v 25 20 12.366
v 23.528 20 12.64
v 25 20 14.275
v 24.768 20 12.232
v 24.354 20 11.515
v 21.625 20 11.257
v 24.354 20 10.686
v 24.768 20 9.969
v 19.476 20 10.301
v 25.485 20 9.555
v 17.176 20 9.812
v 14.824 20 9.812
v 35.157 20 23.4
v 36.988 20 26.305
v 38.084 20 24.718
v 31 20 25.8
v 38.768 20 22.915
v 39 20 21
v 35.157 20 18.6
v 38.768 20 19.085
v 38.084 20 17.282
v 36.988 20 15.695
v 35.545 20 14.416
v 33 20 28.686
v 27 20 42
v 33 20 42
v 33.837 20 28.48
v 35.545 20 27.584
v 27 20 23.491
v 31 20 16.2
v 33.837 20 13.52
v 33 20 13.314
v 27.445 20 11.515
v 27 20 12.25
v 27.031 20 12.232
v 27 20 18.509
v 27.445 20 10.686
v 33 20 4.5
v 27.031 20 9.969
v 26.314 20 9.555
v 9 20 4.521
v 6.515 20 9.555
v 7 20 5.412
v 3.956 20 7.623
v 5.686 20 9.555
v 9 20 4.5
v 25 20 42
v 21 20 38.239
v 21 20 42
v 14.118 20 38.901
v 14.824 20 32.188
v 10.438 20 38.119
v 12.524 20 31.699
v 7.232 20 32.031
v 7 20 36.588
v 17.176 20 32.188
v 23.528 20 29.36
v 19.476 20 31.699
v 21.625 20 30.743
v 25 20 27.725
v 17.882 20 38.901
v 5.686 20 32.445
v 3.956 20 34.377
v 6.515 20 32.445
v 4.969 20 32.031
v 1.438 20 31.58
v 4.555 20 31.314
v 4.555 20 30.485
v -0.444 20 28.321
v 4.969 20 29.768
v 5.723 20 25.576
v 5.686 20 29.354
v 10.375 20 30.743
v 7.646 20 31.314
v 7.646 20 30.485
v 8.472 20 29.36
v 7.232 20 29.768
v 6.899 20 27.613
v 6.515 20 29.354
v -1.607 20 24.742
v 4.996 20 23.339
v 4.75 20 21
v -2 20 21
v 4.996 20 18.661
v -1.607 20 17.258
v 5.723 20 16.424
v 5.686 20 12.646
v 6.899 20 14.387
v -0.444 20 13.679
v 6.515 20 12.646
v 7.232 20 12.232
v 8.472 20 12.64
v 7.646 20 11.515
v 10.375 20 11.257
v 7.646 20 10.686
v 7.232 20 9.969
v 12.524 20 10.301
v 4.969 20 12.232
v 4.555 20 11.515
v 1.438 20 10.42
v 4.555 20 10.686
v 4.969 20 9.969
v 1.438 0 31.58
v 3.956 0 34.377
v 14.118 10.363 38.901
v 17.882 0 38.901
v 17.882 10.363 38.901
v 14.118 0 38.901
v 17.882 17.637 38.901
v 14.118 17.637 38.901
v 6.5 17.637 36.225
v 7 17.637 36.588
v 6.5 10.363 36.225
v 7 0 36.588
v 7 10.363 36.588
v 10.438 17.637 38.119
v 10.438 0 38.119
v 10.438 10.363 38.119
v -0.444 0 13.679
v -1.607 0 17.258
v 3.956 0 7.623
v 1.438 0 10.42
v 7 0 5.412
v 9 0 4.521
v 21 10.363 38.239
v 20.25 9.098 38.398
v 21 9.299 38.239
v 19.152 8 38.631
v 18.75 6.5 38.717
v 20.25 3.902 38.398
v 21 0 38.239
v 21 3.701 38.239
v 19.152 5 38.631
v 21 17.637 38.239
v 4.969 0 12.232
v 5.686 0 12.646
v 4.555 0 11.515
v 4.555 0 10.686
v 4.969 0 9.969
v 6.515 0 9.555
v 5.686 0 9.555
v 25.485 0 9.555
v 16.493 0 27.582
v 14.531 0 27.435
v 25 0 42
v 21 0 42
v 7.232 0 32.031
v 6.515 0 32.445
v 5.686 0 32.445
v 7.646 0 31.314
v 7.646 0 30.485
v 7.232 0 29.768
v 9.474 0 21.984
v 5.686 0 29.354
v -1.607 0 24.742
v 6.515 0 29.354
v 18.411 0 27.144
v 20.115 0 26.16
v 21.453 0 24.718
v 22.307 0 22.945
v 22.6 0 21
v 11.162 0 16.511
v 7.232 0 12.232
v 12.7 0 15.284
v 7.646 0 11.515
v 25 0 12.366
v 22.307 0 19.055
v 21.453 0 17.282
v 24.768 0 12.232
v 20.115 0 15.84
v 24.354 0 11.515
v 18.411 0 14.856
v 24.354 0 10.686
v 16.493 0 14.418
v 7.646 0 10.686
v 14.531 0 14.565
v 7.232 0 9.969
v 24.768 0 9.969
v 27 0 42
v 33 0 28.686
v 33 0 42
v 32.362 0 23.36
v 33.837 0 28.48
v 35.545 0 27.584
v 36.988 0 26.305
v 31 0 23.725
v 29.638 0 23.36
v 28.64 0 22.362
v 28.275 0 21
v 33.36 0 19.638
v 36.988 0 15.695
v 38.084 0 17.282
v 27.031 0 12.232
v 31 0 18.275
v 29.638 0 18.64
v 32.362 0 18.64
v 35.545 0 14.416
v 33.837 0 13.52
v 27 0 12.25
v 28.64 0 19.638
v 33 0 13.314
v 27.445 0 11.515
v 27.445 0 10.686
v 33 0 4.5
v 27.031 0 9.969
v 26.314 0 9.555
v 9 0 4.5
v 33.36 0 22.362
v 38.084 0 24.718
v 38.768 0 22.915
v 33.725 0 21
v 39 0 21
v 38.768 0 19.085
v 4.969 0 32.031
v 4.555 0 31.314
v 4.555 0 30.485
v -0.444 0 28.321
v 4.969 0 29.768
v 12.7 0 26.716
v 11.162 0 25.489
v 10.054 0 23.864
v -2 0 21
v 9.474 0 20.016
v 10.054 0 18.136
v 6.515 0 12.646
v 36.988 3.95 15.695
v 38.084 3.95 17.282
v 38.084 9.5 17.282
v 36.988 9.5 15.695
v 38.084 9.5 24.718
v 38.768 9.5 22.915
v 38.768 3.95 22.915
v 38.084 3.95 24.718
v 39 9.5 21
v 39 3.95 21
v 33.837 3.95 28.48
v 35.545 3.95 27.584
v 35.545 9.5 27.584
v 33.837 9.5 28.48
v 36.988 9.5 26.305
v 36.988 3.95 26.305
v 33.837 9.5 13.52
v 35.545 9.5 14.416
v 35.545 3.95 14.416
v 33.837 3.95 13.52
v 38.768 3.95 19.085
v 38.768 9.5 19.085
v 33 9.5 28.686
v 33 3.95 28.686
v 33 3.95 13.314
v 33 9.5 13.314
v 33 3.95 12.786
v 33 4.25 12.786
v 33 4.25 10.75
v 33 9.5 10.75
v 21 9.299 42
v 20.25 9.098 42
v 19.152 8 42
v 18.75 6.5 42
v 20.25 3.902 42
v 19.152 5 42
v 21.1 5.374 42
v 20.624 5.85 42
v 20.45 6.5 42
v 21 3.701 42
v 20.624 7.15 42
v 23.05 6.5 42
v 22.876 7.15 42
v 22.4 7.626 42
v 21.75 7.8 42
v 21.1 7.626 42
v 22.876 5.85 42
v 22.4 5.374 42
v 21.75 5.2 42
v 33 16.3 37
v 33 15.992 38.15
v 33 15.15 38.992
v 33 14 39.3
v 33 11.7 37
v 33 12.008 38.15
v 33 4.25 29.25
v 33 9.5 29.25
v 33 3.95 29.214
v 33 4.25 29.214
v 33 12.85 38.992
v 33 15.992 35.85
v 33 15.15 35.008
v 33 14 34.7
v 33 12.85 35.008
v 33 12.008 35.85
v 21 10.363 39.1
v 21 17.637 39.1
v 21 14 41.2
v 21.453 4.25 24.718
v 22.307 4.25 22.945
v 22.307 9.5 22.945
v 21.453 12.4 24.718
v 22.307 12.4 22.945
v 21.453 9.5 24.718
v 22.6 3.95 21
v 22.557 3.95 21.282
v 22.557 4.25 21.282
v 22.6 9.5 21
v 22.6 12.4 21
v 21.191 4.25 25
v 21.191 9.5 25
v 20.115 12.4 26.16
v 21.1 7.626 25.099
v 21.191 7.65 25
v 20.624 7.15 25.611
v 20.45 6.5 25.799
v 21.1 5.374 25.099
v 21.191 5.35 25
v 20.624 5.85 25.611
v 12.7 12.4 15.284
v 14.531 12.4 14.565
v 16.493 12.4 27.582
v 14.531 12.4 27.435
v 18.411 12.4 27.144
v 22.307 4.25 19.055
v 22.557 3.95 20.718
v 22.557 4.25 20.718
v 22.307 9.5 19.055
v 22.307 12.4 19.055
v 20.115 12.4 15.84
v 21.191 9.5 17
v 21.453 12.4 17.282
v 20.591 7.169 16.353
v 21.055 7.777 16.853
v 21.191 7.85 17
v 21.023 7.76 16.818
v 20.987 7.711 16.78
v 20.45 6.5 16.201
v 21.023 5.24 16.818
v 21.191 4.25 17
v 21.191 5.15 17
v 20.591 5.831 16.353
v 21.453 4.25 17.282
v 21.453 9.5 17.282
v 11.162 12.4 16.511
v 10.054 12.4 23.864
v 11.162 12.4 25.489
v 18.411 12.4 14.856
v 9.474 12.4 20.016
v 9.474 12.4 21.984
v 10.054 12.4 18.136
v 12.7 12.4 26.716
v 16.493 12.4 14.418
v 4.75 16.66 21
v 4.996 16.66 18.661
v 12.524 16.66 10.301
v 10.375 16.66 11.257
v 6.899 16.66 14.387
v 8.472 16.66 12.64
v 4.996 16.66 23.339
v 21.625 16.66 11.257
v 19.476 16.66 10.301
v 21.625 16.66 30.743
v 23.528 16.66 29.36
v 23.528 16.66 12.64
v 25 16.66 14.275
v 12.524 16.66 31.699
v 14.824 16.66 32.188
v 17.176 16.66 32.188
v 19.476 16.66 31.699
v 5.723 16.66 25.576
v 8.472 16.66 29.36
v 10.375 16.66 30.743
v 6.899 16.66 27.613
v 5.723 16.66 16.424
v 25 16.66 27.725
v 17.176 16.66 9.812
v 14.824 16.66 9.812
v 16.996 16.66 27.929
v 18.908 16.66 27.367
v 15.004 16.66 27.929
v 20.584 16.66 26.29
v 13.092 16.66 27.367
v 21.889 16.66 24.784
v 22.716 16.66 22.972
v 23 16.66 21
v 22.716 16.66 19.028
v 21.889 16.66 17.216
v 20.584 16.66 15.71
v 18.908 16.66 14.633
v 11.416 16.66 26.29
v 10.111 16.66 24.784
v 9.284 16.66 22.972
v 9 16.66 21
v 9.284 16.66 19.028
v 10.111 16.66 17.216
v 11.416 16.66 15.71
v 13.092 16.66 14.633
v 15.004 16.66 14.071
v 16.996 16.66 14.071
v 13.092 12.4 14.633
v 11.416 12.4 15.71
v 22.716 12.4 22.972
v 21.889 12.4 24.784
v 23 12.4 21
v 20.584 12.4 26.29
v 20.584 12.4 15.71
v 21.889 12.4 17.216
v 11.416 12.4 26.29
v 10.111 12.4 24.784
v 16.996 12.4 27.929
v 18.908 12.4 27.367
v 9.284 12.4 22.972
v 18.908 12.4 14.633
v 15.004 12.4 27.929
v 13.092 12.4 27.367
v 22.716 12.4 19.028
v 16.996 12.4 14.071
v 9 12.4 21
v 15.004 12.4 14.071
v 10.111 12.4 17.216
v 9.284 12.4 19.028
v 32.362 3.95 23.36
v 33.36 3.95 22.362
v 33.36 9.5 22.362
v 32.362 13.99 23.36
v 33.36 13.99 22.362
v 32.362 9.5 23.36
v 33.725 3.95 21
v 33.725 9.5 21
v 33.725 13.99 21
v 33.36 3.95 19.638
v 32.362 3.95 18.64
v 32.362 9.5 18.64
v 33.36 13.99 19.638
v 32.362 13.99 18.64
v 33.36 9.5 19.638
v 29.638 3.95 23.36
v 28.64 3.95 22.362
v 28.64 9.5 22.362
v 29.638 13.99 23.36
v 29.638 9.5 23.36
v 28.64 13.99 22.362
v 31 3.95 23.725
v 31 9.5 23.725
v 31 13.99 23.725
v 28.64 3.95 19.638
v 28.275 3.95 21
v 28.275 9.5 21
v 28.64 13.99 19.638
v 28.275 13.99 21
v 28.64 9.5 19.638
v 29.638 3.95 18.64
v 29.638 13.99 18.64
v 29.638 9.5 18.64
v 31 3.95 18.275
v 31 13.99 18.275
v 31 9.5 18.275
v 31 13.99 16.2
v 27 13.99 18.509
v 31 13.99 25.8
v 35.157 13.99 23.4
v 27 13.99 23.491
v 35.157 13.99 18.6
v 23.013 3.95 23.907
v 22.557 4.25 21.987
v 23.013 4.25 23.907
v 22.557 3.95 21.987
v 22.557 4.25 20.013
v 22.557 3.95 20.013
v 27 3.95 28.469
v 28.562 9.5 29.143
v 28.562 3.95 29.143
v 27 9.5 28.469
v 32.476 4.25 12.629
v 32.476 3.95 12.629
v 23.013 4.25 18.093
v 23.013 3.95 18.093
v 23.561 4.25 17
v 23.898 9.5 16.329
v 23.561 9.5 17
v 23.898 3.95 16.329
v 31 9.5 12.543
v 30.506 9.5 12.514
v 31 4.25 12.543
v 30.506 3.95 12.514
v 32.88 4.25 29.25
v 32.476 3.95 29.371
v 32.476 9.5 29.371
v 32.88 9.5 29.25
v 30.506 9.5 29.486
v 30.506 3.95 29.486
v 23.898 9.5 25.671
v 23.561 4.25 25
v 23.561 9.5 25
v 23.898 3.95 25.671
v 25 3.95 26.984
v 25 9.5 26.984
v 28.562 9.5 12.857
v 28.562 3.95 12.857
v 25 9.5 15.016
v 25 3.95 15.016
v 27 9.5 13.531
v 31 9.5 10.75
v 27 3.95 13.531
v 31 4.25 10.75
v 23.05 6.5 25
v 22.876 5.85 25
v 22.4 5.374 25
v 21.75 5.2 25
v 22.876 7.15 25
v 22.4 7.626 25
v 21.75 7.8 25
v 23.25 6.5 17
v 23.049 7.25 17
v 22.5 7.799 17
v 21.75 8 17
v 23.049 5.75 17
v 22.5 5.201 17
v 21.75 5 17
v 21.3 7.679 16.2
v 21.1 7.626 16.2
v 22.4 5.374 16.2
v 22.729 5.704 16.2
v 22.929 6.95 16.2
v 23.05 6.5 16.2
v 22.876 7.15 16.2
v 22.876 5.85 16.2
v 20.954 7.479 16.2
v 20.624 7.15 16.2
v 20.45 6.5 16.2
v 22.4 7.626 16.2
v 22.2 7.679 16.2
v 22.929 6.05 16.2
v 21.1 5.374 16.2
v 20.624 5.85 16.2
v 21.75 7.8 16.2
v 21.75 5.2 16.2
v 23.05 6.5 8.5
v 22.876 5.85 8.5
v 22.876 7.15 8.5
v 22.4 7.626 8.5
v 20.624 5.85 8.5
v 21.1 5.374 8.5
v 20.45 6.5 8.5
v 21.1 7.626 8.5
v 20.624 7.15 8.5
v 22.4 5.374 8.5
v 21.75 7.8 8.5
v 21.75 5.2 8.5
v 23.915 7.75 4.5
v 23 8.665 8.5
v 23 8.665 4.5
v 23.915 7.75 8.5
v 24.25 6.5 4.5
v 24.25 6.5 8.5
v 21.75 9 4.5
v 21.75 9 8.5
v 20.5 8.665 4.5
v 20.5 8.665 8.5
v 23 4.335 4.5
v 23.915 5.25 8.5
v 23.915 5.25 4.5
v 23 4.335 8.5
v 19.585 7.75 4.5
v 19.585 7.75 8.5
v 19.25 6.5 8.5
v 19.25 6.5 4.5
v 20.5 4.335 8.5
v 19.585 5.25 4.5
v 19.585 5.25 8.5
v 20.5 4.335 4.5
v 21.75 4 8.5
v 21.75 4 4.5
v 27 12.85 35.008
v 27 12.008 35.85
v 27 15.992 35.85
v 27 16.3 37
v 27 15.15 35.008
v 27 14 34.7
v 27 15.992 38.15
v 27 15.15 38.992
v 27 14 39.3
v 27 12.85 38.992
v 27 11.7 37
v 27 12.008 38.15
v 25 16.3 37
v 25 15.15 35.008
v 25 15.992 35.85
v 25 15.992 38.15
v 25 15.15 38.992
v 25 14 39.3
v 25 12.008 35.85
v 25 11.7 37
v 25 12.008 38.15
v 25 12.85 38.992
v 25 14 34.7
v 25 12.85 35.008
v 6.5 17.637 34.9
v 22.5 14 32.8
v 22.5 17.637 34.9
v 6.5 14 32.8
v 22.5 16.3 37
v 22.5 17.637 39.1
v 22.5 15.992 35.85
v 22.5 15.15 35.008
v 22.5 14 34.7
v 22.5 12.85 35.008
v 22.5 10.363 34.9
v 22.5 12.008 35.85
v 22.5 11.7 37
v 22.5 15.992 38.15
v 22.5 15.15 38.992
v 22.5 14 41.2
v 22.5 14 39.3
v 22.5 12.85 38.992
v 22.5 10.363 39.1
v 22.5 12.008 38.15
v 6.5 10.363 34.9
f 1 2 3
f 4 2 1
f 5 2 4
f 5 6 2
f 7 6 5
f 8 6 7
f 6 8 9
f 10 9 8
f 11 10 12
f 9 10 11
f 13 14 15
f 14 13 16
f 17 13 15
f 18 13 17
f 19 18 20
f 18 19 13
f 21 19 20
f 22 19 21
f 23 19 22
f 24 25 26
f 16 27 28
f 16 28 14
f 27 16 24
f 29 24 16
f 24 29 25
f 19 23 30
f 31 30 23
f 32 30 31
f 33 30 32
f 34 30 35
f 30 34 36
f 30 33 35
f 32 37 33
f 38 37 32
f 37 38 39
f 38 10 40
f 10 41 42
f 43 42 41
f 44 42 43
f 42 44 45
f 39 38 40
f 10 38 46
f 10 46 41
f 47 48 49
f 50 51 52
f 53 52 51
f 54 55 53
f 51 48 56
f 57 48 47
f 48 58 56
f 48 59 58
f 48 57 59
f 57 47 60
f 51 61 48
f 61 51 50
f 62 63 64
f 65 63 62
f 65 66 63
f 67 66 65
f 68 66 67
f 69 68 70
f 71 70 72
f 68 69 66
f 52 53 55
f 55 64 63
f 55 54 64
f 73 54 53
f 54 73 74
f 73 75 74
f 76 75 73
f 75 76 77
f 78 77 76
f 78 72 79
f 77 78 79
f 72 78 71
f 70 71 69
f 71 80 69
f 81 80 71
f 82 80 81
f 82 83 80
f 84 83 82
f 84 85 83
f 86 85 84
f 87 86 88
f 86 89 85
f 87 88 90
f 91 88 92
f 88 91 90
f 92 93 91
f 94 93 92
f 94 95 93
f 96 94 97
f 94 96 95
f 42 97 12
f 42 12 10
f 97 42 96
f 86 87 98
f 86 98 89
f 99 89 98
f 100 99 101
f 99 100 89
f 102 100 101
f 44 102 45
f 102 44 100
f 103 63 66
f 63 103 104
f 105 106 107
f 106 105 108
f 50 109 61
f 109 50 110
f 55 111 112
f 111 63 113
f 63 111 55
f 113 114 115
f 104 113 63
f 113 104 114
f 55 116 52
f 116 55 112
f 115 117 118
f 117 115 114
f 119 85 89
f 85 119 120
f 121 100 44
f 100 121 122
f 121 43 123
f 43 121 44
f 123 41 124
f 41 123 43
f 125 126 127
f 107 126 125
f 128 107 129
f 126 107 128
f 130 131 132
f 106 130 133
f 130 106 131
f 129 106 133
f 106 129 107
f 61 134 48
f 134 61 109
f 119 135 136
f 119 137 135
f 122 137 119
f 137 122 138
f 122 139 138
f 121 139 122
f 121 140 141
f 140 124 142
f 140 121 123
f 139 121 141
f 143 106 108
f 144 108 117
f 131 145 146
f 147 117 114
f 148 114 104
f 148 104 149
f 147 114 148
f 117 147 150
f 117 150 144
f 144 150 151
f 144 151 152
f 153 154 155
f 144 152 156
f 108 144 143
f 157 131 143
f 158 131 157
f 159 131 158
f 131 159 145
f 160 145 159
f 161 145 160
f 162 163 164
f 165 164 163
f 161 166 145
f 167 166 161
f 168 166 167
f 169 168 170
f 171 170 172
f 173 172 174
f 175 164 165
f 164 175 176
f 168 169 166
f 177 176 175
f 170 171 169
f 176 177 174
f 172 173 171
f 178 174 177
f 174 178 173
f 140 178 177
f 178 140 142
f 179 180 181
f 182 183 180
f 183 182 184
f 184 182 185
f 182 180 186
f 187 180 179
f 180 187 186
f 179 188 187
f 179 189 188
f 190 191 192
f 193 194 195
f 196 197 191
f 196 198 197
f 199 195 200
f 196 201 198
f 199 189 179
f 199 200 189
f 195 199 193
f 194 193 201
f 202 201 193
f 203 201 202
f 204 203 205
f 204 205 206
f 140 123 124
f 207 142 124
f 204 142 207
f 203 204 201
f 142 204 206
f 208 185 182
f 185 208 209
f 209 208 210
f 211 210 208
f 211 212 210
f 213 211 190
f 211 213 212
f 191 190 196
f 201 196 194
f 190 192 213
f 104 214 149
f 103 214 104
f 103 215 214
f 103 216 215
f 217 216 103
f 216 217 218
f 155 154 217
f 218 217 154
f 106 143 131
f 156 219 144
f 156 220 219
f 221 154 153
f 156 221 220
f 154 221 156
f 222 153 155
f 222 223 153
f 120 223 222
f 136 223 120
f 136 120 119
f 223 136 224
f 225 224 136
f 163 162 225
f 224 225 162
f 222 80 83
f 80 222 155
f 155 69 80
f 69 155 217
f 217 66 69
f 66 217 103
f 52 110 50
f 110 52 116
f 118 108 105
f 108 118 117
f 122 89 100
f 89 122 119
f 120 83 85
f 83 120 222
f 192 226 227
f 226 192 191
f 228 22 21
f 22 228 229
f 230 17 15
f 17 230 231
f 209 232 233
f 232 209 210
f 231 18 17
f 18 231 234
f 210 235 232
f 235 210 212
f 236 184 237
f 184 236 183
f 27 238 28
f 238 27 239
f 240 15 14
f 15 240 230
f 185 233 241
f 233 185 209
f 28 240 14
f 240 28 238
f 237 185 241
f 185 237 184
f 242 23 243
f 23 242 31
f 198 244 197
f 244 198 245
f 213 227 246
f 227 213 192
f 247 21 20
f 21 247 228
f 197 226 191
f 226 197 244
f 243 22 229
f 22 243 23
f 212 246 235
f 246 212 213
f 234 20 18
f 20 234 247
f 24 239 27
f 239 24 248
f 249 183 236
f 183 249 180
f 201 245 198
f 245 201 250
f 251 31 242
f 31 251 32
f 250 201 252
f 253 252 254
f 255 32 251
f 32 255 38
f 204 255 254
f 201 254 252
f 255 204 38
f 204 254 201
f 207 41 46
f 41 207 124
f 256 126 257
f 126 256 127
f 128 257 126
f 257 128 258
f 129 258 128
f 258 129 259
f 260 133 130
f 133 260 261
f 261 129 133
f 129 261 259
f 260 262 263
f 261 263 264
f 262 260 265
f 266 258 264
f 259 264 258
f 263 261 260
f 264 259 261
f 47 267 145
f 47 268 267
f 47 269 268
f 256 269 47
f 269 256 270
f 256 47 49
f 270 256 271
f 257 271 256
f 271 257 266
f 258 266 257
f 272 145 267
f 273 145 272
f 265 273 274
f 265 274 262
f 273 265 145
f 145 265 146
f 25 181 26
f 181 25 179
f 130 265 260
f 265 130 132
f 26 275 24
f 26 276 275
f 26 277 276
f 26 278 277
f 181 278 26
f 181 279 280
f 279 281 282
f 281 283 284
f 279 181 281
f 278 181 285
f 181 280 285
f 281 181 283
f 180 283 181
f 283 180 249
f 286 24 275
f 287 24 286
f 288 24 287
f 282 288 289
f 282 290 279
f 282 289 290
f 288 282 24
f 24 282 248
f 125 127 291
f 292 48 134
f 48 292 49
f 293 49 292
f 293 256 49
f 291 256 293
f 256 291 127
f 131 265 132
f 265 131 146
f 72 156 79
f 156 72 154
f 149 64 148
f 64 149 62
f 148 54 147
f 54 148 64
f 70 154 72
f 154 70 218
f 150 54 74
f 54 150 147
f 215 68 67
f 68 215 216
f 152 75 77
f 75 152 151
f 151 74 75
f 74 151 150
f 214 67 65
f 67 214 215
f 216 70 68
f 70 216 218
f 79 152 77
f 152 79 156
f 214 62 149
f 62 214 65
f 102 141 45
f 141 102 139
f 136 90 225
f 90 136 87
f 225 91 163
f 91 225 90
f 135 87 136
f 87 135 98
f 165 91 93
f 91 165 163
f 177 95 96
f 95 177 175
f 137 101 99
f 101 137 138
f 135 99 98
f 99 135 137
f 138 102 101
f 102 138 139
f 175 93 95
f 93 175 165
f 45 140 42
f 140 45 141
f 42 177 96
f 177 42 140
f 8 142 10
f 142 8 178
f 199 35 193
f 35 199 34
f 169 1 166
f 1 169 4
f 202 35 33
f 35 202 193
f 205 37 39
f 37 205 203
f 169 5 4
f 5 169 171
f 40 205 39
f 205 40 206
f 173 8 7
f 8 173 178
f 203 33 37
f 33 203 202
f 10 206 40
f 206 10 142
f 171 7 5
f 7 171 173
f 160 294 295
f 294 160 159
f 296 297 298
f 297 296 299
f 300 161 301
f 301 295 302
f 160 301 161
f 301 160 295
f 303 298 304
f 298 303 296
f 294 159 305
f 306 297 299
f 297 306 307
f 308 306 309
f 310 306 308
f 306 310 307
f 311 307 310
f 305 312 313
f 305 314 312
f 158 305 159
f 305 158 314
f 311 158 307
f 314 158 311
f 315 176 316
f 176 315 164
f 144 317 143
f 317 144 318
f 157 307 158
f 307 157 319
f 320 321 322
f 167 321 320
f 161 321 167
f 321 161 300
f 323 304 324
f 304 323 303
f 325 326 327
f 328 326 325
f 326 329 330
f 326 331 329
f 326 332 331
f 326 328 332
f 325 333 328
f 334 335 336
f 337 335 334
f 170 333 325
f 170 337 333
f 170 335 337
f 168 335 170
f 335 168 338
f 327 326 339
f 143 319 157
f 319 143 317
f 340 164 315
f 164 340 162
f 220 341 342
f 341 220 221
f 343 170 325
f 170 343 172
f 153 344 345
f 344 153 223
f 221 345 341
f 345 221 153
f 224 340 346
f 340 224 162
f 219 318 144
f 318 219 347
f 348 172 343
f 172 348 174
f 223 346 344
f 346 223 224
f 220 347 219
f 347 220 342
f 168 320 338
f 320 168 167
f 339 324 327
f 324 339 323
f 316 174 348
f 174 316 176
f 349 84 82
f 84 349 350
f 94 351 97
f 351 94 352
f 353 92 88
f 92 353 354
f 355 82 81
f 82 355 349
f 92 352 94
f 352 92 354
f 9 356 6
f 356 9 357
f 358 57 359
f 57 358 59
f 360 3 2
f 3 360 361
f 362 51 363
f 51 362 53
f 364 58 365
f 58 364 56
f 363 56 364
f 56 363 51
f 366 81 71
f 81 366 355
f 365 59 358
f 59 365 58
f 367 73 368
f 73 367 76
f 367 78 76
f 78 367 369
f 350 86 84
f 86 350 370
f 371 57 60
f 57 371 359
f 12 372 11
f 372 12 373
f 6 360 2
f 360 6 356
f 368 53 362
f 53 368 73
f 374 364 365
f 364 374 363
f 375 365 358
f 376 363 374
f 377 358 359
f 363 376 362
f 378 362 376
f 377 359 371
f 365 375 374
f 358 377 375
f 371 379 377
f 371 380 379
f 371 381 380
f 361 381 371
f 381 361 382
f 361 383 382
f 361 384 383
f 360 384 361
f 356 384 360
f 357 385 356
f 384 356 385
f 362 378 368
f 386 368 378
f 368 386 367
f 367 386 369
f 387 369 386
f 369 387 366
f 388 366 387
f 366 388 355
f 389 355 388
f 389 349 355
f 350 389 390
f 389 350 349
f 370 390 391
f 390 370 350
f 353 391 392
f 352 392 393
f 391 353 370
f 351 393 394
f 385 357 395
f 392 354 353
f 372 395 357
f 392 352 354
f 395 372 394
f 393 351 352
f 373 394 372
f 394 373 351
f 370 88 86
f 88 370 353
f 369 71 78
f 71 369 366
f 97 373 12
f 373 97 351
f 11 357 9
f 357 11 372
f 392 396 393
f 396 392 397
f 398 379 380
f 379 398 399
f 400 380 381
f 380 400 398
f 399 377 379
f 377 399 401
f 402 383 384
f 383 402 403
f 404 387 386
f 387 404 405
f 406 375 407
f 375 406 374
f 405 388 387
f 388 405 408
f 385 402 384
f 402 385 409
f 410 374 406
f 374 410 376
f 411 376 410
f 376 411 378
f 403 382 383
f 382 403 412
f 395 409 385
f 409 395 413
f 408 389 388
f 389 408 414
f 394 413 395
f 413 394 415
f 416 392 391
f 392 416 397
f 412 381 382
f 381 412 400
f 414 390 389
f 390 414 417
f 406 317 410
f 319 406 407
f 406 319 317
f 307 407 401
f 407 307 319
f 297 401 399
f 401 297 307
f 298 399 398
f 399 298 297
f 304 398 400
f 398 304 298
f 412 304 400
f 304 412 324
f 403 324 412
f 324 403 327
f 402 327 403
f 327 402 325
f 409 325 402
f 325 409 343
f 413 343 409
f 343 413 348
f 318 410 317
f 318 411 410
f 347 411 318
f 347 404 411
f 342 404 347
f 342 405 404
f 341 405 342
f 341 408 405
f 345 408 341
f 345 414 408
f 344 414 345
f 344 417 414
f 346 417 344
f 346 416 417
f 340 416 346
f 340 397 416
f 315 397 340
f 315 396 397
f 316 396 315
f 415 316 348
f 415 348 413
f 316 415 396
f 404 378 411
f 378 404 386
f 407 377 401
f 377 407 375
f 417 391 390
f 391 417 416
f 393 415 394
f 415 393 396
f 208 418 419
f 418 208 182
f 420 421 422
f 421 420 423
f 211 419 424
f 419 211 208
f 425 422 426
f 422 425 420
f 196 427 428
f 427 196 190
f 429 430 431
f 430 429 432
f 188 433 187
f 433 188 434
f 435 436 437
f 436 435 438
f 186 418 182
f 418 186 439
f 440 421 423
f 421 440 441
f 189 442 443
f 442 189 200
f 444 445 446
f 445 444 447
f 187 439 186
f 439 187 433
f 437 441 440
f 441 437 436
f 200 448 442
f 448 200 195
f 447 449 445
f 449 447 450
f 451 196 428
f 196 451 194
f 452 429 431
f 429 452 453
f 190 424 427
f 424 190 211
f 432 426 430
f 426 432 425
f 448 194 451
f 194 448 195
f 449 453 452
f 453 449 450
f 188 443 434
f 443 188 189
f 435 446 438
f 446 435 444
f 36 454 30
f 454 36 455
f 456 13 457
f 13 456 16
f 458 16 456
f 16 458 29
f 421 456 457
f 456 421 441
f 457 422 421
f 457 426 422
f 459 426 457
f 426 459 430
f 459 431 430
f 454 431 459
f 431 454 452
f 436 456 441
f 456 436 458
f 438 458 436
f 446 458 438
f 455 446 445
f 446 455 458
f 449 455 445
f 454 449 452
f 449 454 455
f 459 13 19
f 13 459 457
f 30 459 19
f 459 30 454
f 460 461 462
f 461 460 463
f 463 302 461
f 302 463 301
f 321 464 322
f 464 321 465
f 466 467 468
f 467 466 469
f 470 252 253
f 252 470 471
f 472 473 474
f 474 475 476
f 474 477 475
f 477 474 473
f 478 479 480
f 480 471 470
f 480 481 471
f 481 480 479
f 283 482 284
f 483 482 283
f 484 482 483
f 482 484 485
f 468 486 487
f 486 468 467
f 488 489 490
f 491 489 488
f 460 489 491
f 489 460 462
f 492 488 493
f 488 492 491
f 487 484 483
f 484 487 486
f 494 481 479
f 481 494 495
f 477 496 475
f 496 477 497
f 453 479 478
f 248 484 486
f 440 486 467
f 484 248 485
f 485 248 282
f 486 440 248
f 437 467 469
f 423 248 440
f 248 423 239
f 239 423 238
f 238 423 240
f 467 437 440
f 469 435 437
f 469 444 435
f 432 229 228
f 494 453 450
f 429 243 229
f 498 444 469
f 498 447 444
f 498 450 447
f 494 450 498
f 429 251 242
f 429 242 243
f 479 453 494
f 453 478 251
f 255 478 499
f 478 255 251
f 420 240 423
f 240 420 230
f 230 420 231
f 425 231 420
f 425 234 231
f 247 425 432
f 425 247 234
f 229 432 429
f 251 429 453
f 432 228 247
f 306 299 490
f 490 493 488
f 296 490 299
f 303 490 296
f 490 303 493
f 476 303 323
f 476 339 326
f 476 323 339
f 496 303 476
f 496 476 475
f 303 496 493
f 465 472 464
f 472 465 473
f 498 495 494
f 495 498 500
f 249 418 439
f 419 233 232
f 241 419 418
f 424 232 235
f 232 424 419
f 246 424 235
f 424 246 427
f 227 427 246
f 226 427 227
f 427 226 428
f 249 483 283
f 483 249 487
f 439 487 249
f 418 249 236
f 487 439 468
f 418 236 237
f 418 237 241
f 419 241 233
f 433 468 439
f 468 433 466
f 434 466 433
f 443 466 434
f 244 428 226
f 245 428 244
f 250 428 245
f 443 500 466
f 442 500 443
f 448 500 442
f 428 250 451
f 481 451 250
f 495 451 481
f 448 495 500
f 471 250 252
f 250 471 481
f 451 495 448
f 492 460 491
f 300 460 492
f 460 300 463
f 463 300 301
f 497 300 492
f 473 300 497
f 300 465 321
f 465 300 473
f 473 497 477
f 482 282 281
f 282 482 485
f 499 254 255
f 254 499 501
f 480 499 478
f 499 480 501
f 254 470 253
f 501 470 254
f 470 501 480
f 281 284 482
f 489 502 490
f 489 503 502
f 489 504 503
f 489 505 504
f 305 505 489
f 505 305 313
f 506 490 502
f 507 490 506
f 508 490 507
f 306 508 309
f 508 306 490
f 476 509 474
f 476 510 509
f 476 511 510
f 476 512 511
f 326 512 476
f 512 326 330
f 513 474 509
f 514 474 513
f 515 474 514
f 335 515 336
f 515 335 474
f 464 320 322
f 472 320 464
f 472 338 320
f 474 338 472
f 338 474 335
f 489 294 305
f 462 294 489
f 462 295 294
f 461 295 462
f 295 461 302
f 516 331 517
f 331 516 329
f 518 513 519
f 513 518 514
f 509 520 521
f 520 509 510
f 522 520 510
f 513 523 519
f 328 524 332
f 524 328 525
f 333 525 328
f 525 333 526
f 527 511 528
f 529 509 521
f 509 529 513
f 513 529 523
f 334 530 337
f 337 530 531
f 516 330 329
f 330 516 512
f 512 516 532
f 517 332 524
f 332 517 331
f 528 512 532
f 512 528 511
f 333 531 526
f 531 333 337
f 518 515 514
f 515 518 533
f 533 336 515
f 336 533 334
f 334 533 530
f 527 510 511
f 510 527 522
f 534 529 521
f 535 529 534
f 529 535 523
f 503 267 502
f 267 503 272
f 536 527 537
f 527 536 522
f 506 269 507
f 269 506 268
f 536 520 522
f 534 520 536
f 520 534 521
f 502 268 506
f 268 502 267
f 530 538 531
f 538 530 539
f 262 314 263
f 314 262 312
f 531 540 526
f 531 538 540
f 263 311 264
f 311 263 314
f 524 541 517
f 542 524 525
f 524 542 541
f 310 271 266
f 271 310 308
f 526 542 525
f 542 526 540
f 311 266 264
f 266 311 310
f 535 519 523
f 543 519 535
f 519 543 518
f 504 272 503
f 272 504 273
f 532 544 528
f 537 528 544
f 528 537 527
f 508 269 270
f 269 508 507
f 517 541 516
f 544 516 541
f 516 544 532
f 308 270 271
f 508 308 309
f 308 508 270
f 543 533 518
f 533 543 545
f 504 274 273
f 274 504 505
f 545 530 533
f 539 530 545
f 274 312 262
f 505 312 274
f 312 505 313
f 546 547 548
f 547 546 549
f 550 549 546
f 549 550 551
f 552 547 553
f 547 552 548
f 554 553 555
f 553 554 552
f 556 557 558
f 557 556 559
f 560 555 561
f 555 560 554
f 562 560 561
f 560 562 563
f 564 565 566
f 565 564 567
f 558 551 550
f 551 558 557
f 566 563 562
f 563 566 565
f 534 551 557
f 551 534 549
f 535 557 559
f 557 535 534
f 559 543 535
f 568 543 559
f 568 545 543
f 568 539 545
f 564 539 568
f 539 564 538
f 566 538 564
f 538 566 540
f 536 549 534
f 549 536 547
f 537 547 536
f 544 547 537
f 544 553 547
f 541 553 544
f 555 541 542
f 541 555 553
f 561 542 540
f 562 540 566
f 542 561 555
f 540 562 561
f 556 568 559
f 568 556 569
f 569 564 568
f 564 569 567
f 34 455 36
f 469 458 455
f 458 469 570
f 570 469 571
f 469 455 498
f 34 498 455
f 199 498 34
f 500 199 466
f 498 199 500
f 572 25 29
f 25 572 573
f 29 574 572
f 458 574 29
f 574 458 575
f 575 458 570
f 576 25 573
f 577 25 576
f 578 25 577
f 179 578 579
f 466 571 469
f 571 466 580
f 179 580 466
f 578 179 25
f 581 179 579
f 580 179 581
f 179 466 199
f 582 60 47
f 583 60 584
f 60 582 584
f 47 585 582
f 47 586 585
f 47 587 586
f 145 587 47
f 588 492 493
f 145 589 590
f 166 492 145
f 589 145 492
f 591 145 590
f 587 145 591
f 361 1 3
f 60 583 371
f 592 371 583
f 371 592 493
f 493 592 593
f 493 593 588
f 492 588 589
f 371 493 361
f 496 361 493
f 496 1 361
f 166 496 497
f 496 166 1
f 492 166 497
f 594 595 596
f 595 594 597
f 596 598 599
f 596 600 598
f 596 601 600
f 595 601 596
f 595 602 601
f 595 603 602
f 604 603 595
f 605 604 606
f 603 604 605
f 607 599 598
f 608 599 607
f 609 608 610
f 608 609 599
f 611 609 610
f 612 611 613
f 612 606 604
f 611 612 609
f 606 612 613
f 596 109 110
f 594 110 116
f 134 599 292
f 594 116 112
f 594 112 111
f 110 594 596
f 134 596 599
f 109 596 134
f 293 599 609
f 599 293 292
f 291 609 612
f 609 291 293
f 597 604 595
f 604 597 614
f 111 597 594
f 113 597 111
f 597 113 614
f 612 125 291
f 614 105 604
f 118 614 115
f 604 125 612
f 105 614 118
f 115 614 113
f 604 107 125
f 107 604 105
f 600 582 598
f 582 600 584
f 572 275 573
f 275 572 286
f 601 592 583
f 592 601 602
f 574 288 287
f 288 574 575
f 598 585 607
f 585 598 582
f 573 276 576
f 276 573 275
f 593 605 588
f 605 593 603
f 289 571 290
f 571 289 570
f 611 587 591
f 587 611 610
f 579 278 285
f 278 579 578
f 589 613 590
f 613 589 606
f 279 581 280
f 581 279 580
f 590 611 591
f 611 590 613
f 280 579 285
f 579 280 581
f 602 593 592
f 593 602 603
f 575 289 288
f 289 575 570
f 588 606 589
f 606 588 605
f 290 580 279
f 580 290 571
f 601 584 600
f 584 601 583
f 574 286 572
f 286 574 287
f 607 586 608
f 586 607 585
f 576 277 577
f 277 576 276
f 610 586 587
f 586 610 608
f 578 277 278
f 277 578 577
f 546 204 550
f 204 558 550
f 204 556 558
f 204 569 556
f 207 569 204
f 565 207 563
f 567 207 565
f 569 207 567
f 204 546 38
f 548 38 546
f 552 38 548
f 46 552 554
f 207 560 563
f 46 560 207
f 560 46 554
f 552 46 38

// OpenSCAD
first_layer = 0.3;

difference() {
	
	union() {
		//main cylinder
		translate([16,20,21]) rotate([90,0,0]) cylinder(h=20, r=18);//cube([44, 20, 42]);
		
		//bearing mount
		translate([31,20,21]) rotate([90,0,0]) cylinder (h=20, r=8);
		
		//V3 Mount
		translate([9,0,-7]) cube([24, 20, 22]);
		translate([21,first_layer/2,-11]) rotate([90,0,0]) cube([24, 22, first_layer], center=true);
		//translate([27,first_layer/2,45]) rotate([90,0,0]) cube([12, 22, first_layer], center=true);
		
		//filament support
		translate([21.75,6.5,34]) rotate([0,0,0]) cylinder (h=8, r=3, $fn=12);
		
		//groovemount supports
//		translate([33,6.5,-7]) rotate([0,0,0]) cylinder (h=16, r=5, $fn=12);
//		translate([9,6.5,-7]) rotate([0,0,0]) cylinder (h=16, r=5, $fn=12);
		
		//clamp
		translate([21,0,28]) cube([12, 20, 14]);
	}
	
	//pulley opening
	translate([16,21,21]) rotate([90,0,0]){
		cylinder (h=22, r=6.6);
		
		rotate([0,0,45]) {
		//translate([14,0,0]) cylinder(h=22, r=1.6, $fn=12);
		translate([0,14,0]) cylinder(h=22, r=1.6, $fn=12);
		translate([-14,0,0]) cylinder(h=22, r=1.6, $fn=12);
		translate([0,-14,0]) cylinder(h=22, r=1.6, $fn=12);
		}
	}
	
	//gearhead indentation
	translate([16,20.01,21]) rotate([90,0,0]) cylinder (h=3.35, r=11.25);

	//pulley hub indentation
	translate([16,20-2,21]) rotate([90,0,0]) cylinder (h=5.6, r=7);
	
	//bearing screws
	translate([31,21,21]) rotate([90,0,0]) cylinder (h=22, r=2.725, $fn=12); //precision m5

	//translate([31,21,21]) rotate([90,0,0]) cylinder (h=22, r=2.6, $fn=12); //regular M5 screw
	//translate([31,22,21]) rotate([90,30,0]) cylinder (h=8.01, r=8.1/2, $fn=6); //M4
	translate([31,22,21]) rotate([90,30,0]) cylinder (h=8.01, r=4.8, $fn=6); //M5
	
	//bearing
	translate([31,9.5,21]) rotate([90,0,0]) cylinder (h=5.55, r=8.5);
	translate([31,9.5-5.25,21-8.25-2]) cube([20, 5.25, 18.5]);
	
	//opening between bearing and pulley
	translate([20,9.5-5.25,21-8.25+3.25+1]) cube([10, 5.25, 8]);

	//filament path chamfer
	translate([21.75,6.5,15]) rotate([0,0,0]) cylinder (h=2, r1=1, r2=1.5, $fn=12);		
	
	//filament path
	translate([21.75,6.5,-10]) rotate([0,0,0]) cylinder (h=60, r=1.3, $fn=12); 
	translate([21.75,6.5,-51.5]) rotate([0,0,0]) cylinder (h=60, r=2.5, $fn=12); 
	
	//V3 Mount
//	translate([21.75,6.5,-2]) rotate([0,0,0]) cylinder (h=5, r=8.25);
	translate([21.75,6.5,-7]) rotate([0,0,0]) cylinder (h=8, r=4.5);
//	translate([21.75-8,6.5-8,-2]) cube([16, 8, 5]);
//	translate([21.75-6,6.5-7,-7]) cube([12, 7, 5]);
	translate([21.75,6.5,3.5]) rotate([90,0,0]) cylinder (h=10, r=1,  $fn=12);
	
	//groovemount supports
//	translate([33,6.5,-8]) rotate([0,0,0]) cylinder (h=20, r=1.6, $fn=12);
//	translate([33,6.5,7]) rotate([0,0,0]) cylinder (h=3, r=3.5, $fn=6);

//	translate([9,6.5,-8]) rotate([0,0,0]) cylinder (h=20, r=1.6, $fn=12);
//	translate([9,6.5,7]) rotate([0,0,0]) cylinder (h=3, r=3.5, $fn=6);
//	translate([3,3,7]) cube([8, 7, 3]);
	
	//clamp slit
	translate([25,-1,10]) cube([2, 22, 35]);
	//clamp nut
	translate([6.5,14,37]) rotate([0,90,0]) cylinder (h=16, r=4.2, $fn=6);
	//clamp screw hole
	translate([15,14,37]) rotate([0,90,0]) cylinder (h=20, r=2.3, $fn=12);
	
	translate([9,-2,-25.5])cube(30,20,10);
    translate([9,-2,43.5])cube(30,20,10);
}
